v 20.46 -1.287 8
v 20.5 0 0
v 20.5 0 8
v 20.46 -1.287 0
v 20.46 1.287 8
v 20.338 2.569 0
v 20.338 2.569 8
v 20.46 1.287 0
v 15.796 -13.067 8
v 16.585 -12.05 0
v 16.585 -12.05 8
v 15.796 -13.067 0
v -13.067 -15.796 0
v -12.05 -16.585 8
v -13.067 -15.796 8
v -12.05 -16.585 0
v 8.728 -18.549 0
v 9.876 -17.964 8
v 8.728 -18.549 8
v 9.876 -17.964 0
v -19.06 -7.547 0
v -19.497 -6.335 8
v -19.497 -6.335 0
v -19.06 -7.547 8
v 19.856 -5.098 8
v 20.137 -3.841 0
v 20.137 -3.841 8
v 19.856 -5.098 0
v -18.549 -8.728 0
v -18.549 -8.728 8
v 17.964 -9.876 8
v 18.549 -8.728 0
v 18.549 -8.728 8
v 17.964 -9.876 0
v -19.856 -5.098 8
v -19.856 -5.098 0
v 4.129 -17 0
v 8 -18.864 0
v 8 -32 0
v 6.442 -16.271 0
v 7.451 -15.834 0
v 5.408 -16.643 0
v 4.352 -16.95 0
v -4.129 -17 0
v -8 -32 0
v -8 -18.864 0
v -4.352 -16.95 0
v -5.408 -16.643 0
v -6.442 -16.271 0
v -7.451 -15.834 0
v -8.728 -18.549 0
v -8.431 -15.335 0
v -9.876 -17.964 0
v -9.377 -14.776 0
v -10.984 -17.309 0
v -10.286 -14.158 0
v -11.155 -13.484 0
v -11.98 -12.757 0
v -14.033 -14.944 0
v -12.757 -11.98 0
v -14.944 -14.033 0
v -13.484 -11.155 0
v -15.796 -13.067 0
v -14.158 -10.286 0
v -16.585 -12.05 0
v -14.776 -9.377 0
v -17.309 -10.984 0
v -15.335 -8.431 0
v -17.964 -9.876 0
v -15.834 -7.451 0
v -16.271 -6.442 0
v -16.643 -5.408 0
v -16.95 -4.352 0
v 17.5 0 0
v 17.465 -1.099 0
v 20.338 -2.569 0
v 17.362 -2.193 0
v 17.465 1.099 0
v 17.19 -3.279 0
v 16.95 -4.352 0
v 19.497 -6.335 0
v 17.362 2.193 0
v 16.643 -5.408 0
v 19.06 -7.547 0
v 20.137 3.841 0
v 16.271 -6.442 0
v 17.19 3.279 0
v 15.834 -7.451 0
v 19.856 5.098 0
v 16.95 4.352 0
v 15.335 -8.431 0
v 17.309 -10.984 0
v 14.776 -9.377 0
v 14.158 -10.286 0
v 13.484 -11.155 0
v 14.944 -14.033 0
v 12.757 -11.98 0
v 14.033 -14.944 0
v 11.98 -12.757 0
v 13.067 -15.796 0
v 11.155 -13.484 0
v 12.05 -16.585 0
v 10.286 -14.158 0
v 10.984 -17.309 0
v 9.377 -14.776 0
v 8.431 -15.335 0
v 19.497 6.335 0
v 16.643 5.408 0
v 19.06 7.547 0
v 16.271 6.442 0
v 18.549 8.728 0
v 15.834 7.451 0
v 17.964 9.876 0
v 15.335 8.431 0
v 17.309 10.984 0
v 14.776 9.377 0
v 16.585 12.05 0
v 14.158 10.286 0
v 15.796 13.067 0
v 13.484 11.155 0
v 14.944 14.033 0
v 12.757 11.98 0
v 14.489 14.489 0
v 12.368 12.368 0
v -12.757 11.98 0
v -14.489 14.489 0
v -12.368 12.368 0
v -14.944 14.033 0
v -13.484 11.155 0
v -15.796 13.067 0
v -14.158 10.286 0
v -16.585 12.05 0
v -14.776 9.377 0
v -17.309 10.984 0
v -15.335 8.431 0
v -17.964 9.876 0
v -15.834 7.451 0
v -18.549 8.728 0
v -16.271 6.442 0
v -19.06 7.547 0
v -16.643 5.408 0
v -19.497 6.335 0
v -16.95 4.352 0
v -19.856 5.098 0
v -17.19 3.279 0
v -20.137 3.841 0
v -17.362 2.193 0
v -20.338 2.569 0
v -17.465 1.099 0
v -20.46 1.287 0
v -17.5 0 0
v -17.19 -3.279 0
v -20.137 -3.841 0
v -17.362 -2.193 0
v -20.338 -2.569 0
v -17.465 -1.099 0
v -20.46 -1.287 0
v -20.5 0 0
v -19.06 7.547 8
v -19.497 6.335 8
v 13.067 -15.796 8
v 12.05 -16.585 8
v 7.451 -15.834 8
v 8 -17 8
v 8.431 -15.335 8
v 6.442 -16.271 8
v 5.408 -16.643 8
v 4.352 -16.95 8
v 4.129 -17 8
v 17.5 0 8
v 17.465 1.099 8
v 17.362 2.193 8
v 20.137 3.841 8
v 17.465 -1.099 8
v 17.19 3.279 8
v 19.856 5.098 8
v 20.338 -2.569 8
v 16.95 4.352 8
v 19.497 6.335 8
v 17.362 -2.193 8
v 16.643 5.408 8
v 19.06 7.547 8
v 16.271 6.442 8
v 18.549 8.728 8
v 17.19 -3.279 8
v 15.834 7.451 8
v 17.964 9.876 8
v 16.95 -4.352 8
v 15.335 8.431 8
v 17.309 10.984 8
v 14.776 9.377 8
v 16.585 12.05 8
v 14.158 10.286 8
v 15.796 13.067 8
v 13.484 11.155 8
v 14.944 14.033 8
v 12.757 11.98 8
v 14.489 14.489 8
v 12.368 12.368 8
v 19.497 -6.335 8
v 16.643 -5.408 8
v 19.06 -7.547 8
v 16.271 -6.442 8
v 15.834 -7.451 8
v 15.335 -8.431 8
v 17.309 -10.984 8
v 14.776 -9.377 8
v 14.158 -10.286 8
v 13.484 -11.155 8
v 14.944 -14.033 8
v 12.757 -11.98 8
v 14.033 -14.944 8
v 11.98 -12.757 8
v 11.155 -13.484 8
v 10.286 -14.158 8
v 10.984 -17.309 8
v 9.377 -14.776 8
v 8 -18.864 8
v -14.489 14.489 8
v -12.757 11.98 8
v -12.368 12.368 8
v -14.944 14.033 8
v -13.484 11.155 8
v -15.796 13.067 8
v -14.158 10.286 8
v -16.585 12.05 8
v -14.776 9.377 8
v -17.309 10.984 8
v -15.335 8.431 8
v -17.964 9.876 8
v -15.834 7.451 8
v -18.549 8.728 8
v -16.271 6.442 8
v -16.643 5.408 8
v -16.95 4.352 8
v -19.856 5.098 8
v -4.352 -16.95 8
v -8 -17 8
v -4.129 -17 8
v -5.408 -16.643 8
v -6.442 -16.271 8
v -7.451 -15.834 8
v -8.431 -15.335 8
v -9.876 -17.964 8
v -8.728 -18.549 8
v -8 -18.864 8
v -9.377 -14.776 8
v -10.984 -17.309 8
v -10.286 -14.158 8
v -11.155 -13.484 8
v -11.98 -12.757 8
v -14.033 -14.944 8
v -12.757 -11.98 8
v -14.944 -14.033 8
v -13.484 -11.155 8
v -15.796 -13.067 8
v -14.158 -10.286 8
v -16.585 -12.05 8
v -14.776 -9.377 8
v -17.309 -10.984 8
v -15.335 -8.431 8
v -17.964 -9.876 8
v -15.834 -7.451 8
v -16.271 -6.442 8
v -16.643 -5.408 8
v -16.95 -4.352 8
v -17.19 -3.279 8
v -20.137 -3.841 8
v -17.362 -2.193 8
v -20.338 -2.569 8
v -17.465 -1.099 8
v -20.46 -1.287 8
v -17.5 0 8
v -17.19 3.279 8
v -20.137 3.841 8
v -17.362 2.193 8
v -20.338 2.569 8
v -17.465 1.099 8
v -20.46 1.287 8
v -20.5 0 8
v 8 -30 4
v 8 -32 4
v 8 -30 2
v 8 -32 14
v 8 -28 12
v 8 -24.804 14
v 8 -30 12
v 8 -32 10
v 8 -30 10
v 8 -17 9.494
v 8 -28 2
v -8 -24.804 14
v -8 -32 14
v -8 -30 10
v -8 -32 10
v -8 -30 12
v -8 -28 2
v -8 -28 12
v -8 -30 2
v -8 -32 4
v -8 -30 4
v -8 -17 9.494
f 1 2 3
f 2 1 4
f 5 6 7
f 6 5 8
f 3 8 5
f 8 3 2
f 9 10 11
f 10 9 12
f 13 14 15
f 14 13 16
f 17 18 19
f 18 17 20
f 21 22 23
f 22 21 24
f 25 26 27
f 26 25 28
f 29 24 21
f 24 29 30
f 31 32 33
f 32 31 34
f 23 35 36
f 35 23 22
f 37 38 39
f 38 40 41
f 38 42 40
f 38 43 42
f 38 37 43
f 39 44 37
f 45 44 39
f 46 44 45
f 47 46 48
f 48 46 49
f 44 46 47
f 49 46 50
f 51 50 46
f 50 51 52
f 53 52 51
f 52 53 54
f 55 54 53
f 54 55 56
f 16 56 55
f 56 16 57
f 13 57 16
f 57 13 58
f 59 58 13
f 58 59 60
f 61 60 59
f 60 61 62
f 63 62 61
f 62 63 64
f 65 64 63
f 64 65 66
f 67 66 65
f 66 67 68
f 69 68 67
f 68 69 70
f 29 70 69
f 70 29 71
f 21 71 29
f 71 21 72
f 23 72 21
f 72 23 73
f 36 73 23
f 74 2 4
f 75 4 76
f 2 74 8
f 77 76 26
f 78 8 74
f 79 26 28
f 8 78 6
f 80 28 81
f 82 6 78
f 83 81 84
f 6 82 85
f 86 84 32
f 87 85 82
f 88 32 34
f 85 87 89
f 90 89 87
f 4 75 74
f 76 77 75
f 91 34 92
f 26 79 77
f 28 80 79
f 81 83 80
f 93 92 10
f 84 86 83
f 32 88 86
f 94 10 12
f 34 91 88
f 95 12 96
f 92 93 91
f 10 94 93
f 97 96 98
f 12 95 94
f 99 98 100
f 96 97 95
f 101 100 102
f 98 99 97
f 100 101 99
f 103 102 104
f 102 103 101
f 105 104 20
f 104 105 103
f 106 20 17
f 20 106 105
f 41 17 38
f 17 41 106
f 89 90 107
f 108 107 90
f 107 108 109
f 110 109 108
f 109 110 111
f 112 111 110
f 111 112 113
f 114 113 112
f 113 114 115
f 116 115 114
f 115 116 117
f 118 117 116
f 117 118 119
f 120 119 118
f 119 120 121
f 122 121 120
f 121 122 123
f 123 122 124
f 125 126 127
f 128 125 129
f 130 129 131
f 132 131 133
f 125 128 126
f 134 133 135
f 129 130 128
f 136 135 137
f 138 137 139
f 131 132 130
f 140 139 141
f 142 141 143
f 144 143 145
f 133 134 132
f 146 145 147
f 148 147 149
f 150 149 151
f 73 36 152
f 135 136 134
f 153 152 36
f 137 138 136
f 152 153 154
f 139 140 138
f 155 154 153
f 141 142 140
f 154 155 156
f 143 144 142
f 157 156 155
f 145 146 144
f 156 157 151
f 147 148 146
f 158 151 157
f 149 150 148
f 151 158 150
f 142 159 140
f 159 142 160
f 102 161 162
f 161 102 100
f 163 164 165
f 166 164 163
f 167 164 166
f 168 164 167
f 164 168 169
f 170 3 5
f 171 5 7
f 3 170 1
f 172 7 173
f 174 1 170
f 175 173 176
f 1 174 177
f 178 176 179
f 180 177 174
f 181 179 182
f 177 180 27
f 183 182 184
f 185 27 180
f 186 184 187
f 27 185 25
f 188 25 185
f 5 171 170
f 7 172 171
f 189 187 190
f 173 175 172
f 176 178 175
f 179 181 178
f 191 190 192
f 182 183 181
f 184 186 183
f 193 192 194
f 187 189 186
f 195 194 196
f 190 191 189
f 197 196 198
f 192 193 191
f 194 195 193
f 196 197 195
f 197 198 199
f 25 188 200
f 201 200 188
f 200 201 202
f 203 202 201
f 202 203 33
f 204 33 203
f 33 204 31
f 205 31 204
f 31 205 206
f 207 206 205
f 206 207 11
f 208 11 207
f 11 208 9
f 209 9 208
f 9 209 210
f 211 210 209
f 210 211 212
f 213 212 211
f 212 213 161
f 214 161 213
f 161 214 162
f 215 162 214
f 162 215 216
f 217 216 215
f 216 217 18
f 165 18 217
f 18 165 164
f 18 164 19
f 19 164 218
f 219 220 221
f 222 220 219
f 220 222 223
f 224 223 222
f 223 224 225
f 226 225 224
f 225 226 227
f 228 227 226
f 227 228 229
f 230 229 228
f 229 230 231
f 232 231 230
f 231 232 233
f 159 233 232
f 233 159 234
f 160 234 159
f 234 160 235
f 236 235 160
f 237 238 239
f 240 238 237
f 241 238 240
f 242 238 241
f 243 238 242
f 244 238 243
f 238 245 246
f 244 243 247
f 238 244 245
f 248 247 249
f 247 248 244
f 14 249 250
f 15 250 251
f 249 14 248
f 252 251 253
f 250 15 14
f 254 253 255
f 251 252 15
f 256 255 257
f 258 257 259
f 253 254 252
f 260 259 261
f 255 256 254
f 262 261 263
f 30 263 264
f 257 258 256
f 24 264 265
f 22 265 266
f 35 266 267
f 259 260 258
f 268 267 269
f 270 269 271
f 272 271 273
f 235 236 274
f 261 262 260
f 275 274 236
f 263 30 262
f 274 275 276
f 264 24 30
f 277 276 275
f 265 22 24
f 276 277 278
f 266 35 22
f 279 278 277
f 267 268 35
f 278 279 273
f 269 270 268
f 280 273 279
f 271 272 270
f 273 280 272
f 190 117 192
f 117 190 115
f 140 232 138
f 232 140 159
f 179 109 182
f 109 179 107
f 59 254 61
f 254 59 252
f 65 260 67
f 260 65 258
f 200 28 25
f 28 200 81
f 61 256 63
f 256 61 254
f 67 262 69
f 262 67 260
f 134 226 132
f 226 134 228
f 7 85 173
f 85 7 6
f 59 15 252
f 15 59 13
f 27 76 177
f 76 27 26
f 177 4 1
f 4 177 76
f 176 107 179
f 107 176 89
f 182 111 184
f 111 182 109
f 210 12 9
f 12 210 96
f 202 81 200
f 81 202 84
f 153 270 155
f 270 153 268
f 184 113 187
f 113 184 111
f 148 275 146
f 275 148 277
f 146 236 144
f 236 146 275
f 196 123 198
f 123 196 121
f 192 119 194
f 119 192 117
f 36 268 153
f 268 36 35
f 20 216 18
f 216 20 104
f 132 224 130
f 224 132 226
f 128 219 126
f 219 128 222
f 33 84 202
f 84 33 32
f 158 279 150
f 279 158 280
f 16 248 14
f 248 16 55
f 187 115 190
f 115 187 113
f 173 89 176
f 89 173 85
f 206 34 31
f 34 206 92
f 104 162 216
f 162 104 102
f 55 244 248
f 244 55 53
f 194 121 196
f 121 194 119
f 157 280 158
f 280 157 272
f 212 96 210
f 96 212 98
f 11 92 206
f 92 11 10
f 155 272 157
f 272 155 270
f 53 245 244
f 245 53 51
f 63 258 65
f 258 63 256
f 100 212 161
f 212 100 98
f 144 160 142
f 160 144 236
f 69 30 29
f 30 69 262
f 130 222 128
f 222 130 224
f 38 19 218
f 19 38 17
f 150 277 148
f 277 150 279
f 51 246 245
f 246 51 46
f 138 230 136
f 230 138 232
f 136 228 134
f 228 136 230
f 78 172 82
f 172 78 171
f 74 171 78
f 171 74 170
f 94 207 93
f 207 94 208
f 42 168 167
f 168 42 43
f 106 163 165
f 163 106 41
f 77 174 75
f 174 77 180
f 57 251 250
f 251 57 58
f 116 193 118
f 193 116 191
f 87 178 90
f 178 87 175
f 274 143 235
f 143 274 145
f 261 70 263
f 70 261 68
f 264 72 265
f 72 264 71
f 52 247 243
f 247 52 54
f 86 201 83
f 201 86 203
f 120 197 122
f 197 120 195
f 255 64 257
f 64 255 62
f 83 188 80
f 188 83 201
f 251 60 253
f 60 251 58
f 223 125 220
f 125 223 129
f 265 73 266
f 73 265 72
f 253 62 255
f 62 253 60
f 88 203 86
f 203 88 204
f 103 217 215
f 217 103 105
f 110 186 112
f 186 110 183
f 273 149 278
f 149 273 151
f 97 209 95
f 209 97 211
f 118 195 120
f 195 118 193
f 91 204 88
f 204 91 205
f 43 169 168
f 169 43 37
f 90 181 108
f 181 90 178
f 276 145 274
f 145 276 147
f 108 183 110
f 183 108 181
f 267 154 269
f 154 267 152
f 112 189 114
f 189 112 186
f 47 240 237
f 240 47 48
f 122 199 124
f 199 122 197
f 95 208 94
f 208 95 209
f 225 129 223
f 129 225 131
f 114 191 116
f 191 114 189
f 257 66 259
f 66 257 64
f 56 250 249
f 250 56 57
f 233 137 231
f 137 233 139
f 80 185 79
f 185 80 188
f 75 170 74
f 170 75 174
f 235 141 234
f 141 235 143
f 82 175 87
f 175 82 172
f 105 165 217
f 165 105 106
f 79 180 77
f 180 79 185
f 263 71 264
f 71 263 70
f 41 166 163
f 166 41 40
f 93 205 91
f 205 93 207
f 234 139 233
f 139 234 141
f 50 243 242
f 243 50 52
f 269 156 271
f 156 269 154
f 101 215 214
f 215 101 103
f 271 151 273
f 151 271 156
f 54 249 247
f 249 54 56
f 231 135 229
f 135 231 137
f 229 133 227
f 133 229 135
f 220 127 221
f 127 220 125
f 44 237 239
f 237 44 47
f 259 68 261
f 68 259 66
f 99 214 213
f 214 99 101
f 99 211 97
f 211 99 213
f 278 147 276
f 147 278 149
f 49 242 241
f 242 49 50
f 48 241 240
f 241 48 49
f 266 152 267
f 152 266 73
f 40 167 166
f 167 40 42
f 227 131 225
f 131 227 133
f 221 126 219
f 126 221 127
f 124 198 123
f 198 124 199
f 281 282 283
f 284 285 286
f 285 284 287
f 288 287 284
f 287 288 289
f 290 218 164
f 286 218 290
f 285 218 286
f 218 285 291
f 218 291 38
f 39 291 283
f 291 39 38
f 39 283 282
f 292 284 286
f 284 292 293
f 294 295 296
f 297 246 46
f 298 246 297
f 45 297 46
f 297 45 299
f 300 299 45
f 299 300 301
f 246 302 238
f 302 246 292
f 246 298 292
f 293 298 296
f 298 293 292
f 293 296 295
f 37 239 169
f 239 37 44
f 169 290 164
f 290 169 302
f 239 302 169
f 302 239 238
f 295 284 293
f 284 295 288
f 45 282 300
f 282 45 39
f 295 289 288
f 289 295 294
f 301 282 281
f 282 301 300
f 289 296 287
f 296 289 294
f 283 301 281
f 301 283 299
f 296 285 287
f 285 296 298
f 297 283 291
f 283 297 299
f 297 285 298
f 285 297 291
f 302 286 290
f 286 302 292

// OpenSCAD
$fn=100;

difference() {
cylinder(h=8, d=41);
cylinder(h=9, d=35);
rotate([0,0,45]) { cube([35,35, 9],center=false); }
}
translate([-8,-32,0]) difference() {
	cube([16, 15, 14]);

translate([-50,0,4]) cube([100,2,6]);
translate([-50,2,2]) cube([100,2,10]);
translate([0,12,17]) rotate([60,0,0]) cube([50,10,20],center=true);
}
